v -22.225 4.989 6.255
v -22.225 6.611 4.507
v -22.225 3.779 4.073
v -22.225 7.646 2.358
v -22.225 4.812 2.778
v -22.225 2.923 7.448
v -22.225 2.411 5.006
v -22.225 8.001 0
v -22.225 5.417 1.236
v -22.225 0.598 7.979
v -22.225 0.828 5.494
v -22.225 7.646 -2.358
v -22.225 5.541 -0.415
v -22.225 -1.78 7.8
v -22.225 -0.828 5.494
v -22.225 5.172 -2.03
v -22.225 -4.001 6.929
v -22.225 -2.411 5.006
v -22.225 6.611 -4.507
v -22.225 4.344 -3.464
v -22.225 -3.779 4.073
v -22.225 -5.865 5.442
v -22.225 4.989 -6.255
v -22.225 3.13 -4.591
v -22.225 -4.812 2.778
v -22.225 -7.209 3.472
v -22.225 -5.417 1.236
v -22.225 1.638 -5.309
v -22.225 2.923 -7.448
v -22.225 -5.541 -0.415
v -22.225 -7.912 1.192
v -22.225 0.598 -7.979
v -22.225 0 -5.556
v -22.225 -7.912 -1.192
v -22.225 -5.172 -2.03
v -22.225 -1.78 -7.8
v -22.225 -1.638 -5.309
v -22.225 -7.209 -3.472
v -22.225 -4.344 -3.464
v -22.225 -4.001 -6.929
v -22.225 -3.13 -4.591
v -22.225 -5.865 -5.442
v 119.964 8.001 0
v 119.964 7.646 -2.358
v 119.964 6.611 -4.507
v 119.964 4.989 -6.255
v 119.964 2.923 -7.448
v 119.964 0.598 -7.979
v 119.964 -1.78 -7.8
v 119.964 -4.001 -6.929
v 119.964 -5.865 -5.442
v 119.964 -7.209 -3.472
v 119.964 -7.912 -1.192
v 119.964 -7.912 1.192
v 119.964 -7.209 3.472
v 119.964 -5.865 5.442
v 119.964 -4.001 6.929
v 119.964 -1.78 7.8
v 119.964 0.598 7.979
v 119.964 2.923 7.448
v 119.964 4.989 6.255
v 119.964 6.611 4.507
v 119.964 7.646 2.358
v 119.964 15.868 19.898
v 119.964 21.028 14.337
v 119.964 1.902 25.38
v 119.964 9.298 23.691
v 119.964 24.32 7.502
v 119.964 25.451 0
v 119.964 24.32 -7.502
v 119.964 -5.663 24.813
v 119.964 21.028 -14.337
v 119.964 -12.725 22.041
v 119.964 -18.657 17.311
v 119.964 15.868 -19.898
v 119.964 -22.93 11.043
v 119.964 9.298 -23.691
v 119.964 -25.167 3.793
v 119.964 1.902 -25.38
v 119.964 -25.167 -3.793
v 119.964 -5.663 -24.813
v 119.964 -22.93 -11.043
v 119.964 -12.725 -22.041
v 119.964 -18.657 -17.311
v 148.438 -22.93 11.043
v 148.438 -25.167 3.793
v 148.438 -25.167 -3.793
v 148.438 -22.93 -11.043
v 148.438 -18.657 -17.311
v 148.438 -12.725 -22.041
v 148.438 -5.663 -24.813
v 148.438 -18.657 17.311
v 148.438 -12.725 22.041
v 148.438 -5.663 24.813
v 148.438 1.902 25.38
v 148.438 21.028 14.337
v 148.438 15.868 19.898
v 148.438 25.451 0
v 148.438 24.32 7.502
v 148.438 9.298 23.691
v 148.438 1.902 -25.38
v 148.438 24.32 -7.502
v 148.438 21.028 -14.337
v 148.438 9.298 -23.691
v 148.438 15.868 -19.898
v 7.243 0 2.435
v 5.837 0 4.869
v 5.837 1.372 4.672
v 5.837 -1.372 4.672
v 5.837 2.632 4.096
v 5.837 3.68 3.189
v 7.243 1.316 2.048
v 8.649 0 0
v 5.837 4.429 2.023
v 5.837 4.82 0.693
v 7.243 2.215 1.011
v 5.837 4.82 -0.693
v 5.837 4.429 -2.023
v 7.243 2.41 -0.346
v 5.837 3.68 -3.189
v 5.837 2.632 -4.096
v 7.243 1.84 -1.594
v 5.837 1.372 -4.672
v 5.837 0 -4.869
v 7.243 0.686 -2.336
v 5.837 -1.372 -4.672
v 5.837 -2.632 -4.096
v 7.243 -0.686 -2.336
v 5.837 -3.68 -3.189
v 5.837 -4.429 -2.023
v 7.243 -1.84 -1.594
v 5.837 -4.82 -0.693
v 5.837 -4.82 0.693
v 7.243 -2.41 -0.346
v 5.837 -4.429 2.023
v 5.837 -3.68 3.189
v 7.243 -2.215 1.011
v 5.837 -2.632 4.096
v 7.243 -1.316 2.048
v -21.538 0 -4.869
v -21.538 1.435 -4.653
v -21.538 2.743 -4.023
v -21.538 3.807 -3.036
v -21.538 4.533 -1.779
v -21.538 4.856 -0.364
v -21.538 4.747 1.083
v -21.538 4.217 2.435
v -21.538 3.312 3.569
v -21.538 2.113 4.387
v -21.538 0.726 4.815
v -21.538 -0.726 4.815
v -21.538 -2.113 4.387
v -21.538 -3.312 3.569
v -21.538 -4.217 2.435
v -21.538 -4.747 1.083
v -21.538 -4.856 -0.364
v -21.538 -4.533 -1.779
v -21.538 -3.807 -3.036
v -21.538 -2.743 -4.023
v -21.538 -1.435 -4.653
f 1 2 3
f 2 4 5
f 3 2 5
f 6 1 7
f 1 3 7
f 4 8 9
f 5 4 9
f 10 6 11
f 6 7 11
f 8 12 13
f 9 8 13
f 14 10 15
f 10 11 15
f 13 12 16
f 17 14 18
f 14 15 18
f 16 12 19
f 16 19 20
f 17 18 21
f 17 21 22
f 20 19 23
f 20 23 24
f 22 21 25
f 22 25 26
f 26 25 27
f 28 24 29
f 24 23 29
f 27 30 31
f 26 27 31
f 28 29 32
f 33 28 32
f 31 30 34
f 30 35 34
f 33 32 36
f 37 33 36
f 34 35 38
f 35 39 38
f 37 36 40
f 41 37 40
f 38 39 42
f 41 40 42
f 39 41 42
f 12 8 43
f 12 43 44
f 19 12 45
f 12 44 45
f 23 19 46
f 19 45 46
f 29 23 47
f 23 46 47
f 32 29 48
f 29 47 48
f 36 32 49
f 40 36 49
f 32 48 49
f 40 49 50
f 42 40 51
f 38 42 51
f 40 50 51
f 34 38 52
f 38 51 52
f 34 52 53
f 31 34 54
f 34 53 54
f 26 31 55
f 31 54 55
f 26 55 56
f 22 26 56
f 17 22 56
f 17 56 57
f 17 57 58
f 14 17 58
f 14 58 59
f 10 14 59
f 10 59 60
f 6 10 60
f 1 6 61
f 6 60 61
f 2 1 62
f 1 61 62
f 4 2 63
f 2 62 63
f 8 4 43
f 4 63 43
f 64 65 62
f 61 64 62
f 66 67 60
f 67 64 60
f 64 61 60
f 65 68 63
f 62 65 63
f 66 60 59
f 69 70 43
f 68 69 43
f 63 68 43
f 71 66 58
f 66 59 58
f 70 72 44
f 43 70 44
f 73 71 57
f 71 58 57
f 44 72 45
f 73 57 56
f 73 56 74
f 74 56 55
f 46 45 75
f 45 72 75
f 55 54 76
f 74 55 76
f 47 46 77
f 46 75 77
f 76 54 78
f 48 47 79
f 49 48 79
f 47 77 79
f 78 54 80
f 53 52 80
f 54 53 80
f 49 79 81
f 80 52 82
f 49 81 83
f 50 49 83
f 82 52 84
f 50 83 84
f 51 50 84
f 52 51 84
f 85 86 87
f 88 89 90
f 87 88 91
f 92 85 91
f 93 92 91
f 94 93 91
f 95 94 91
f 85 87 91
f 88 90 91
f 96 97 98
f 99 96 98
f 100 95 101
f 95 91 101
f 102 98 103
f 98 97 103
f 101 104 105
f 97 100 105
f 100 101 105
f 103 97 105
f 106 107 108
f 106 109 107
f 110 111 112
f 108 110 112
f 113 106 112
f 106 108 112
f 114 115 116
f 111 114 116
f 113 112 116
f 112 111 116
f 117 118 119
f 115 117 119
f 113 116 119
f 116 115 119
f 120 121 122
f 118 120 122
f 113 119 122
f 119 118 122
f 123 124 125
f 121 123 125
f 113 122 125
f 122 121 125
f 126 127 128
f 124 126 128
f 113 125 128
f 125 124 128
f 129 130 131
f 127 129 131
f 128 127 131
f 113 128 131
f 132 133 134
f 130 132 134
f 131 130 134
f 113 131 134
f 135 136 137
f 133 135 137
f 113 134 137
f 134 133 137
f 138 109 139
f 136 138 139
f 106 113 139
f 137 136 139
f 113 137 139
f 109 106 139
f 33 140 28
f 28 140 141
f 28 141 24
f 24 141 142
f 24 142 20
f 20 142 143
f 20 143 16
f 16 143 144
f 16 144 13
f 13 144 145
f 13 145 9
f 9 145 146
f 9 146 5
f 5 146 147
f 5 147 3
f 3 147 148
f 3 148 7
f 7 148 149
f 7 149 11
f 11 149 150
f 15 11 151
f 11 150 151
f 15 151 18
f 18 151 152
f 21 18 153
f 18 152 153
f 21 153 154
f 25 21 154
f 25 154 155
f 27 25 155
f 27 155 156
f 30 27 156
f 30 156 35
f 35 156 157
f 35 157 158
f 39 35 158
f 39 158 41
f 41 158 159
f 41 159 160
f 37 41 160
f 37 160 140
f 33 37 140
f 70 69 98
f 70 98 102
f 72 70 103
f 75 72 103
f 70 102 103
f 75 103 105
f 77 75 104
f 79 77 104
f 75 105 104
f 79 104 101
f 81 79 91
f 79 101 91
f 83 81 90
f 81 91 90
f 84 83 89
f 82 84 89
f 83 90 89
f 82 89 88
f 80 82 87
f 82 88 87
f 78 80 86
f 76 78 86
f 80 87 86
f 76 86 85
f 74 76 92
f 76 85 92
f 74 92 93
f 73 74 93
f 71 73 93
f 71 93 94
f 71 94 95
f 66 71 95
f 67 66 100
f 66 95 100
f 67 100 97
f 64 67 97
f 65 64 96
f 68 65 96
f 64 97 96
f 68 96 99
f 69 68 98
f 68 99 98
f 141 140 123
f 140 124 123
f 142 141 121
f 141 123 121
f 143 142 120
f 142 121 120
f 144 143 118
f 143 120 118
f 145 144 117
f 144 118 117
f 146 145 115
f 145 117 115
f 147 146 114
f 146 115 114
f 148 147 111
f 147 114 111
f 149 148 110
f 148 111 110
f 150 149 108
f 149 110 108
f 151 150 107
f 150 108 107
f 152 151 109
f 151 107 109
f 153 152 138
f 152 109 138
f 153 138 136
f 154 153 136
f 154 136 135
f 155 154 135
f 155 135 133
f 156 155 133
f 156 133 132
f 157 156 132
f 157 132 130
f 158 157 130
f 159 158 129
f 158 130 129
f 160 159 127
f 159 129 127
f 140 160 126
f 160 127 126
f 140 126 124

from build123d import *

# Parameters (mm, degrees)
HOLE1_D           = 9.73836
HOLE1_DEPTH       = 28.062477616
HOLE1_CSINK_D     = 11.1125
HOLE1_CSINK_ANGLE = 90
HOLE1_TIP         = 2.811222384


with BuildPart() as part:
    # Sketch1 → Revolve1 (revolve)
    with BuildSketch(Plane.XY):
        Polygon((-22.225, 0), (-22.225, 8.001), (119.9642, 8.001), (119.9642, 25.4508), (148.4376, 25.4508), (148.4376, 0), align=None)
    revolve(axis=Axis((148.4376, 0, 0), (-1, 0, 0)))

    # Hole1
    with Locations(Plane.ZY.offset(22.225)):
        with Locations((0, 0)):
            CounterSinkHole(HOLE1_D / 2, HOLE1_CSINK_D / 2, depth=HOLE1_DEPTH, counter_sink_angle=HOLE1_CSINK_ANGLE)
            with Locations((0, 0, -(HOLE1_DEPTH + HOLE1_TIP / 2))):  # 120° drill point
                Cone(0, HOLE1_D / 2, HOLE1_TIP, mode=Mode.SUBTRACT)


solid = part.part
